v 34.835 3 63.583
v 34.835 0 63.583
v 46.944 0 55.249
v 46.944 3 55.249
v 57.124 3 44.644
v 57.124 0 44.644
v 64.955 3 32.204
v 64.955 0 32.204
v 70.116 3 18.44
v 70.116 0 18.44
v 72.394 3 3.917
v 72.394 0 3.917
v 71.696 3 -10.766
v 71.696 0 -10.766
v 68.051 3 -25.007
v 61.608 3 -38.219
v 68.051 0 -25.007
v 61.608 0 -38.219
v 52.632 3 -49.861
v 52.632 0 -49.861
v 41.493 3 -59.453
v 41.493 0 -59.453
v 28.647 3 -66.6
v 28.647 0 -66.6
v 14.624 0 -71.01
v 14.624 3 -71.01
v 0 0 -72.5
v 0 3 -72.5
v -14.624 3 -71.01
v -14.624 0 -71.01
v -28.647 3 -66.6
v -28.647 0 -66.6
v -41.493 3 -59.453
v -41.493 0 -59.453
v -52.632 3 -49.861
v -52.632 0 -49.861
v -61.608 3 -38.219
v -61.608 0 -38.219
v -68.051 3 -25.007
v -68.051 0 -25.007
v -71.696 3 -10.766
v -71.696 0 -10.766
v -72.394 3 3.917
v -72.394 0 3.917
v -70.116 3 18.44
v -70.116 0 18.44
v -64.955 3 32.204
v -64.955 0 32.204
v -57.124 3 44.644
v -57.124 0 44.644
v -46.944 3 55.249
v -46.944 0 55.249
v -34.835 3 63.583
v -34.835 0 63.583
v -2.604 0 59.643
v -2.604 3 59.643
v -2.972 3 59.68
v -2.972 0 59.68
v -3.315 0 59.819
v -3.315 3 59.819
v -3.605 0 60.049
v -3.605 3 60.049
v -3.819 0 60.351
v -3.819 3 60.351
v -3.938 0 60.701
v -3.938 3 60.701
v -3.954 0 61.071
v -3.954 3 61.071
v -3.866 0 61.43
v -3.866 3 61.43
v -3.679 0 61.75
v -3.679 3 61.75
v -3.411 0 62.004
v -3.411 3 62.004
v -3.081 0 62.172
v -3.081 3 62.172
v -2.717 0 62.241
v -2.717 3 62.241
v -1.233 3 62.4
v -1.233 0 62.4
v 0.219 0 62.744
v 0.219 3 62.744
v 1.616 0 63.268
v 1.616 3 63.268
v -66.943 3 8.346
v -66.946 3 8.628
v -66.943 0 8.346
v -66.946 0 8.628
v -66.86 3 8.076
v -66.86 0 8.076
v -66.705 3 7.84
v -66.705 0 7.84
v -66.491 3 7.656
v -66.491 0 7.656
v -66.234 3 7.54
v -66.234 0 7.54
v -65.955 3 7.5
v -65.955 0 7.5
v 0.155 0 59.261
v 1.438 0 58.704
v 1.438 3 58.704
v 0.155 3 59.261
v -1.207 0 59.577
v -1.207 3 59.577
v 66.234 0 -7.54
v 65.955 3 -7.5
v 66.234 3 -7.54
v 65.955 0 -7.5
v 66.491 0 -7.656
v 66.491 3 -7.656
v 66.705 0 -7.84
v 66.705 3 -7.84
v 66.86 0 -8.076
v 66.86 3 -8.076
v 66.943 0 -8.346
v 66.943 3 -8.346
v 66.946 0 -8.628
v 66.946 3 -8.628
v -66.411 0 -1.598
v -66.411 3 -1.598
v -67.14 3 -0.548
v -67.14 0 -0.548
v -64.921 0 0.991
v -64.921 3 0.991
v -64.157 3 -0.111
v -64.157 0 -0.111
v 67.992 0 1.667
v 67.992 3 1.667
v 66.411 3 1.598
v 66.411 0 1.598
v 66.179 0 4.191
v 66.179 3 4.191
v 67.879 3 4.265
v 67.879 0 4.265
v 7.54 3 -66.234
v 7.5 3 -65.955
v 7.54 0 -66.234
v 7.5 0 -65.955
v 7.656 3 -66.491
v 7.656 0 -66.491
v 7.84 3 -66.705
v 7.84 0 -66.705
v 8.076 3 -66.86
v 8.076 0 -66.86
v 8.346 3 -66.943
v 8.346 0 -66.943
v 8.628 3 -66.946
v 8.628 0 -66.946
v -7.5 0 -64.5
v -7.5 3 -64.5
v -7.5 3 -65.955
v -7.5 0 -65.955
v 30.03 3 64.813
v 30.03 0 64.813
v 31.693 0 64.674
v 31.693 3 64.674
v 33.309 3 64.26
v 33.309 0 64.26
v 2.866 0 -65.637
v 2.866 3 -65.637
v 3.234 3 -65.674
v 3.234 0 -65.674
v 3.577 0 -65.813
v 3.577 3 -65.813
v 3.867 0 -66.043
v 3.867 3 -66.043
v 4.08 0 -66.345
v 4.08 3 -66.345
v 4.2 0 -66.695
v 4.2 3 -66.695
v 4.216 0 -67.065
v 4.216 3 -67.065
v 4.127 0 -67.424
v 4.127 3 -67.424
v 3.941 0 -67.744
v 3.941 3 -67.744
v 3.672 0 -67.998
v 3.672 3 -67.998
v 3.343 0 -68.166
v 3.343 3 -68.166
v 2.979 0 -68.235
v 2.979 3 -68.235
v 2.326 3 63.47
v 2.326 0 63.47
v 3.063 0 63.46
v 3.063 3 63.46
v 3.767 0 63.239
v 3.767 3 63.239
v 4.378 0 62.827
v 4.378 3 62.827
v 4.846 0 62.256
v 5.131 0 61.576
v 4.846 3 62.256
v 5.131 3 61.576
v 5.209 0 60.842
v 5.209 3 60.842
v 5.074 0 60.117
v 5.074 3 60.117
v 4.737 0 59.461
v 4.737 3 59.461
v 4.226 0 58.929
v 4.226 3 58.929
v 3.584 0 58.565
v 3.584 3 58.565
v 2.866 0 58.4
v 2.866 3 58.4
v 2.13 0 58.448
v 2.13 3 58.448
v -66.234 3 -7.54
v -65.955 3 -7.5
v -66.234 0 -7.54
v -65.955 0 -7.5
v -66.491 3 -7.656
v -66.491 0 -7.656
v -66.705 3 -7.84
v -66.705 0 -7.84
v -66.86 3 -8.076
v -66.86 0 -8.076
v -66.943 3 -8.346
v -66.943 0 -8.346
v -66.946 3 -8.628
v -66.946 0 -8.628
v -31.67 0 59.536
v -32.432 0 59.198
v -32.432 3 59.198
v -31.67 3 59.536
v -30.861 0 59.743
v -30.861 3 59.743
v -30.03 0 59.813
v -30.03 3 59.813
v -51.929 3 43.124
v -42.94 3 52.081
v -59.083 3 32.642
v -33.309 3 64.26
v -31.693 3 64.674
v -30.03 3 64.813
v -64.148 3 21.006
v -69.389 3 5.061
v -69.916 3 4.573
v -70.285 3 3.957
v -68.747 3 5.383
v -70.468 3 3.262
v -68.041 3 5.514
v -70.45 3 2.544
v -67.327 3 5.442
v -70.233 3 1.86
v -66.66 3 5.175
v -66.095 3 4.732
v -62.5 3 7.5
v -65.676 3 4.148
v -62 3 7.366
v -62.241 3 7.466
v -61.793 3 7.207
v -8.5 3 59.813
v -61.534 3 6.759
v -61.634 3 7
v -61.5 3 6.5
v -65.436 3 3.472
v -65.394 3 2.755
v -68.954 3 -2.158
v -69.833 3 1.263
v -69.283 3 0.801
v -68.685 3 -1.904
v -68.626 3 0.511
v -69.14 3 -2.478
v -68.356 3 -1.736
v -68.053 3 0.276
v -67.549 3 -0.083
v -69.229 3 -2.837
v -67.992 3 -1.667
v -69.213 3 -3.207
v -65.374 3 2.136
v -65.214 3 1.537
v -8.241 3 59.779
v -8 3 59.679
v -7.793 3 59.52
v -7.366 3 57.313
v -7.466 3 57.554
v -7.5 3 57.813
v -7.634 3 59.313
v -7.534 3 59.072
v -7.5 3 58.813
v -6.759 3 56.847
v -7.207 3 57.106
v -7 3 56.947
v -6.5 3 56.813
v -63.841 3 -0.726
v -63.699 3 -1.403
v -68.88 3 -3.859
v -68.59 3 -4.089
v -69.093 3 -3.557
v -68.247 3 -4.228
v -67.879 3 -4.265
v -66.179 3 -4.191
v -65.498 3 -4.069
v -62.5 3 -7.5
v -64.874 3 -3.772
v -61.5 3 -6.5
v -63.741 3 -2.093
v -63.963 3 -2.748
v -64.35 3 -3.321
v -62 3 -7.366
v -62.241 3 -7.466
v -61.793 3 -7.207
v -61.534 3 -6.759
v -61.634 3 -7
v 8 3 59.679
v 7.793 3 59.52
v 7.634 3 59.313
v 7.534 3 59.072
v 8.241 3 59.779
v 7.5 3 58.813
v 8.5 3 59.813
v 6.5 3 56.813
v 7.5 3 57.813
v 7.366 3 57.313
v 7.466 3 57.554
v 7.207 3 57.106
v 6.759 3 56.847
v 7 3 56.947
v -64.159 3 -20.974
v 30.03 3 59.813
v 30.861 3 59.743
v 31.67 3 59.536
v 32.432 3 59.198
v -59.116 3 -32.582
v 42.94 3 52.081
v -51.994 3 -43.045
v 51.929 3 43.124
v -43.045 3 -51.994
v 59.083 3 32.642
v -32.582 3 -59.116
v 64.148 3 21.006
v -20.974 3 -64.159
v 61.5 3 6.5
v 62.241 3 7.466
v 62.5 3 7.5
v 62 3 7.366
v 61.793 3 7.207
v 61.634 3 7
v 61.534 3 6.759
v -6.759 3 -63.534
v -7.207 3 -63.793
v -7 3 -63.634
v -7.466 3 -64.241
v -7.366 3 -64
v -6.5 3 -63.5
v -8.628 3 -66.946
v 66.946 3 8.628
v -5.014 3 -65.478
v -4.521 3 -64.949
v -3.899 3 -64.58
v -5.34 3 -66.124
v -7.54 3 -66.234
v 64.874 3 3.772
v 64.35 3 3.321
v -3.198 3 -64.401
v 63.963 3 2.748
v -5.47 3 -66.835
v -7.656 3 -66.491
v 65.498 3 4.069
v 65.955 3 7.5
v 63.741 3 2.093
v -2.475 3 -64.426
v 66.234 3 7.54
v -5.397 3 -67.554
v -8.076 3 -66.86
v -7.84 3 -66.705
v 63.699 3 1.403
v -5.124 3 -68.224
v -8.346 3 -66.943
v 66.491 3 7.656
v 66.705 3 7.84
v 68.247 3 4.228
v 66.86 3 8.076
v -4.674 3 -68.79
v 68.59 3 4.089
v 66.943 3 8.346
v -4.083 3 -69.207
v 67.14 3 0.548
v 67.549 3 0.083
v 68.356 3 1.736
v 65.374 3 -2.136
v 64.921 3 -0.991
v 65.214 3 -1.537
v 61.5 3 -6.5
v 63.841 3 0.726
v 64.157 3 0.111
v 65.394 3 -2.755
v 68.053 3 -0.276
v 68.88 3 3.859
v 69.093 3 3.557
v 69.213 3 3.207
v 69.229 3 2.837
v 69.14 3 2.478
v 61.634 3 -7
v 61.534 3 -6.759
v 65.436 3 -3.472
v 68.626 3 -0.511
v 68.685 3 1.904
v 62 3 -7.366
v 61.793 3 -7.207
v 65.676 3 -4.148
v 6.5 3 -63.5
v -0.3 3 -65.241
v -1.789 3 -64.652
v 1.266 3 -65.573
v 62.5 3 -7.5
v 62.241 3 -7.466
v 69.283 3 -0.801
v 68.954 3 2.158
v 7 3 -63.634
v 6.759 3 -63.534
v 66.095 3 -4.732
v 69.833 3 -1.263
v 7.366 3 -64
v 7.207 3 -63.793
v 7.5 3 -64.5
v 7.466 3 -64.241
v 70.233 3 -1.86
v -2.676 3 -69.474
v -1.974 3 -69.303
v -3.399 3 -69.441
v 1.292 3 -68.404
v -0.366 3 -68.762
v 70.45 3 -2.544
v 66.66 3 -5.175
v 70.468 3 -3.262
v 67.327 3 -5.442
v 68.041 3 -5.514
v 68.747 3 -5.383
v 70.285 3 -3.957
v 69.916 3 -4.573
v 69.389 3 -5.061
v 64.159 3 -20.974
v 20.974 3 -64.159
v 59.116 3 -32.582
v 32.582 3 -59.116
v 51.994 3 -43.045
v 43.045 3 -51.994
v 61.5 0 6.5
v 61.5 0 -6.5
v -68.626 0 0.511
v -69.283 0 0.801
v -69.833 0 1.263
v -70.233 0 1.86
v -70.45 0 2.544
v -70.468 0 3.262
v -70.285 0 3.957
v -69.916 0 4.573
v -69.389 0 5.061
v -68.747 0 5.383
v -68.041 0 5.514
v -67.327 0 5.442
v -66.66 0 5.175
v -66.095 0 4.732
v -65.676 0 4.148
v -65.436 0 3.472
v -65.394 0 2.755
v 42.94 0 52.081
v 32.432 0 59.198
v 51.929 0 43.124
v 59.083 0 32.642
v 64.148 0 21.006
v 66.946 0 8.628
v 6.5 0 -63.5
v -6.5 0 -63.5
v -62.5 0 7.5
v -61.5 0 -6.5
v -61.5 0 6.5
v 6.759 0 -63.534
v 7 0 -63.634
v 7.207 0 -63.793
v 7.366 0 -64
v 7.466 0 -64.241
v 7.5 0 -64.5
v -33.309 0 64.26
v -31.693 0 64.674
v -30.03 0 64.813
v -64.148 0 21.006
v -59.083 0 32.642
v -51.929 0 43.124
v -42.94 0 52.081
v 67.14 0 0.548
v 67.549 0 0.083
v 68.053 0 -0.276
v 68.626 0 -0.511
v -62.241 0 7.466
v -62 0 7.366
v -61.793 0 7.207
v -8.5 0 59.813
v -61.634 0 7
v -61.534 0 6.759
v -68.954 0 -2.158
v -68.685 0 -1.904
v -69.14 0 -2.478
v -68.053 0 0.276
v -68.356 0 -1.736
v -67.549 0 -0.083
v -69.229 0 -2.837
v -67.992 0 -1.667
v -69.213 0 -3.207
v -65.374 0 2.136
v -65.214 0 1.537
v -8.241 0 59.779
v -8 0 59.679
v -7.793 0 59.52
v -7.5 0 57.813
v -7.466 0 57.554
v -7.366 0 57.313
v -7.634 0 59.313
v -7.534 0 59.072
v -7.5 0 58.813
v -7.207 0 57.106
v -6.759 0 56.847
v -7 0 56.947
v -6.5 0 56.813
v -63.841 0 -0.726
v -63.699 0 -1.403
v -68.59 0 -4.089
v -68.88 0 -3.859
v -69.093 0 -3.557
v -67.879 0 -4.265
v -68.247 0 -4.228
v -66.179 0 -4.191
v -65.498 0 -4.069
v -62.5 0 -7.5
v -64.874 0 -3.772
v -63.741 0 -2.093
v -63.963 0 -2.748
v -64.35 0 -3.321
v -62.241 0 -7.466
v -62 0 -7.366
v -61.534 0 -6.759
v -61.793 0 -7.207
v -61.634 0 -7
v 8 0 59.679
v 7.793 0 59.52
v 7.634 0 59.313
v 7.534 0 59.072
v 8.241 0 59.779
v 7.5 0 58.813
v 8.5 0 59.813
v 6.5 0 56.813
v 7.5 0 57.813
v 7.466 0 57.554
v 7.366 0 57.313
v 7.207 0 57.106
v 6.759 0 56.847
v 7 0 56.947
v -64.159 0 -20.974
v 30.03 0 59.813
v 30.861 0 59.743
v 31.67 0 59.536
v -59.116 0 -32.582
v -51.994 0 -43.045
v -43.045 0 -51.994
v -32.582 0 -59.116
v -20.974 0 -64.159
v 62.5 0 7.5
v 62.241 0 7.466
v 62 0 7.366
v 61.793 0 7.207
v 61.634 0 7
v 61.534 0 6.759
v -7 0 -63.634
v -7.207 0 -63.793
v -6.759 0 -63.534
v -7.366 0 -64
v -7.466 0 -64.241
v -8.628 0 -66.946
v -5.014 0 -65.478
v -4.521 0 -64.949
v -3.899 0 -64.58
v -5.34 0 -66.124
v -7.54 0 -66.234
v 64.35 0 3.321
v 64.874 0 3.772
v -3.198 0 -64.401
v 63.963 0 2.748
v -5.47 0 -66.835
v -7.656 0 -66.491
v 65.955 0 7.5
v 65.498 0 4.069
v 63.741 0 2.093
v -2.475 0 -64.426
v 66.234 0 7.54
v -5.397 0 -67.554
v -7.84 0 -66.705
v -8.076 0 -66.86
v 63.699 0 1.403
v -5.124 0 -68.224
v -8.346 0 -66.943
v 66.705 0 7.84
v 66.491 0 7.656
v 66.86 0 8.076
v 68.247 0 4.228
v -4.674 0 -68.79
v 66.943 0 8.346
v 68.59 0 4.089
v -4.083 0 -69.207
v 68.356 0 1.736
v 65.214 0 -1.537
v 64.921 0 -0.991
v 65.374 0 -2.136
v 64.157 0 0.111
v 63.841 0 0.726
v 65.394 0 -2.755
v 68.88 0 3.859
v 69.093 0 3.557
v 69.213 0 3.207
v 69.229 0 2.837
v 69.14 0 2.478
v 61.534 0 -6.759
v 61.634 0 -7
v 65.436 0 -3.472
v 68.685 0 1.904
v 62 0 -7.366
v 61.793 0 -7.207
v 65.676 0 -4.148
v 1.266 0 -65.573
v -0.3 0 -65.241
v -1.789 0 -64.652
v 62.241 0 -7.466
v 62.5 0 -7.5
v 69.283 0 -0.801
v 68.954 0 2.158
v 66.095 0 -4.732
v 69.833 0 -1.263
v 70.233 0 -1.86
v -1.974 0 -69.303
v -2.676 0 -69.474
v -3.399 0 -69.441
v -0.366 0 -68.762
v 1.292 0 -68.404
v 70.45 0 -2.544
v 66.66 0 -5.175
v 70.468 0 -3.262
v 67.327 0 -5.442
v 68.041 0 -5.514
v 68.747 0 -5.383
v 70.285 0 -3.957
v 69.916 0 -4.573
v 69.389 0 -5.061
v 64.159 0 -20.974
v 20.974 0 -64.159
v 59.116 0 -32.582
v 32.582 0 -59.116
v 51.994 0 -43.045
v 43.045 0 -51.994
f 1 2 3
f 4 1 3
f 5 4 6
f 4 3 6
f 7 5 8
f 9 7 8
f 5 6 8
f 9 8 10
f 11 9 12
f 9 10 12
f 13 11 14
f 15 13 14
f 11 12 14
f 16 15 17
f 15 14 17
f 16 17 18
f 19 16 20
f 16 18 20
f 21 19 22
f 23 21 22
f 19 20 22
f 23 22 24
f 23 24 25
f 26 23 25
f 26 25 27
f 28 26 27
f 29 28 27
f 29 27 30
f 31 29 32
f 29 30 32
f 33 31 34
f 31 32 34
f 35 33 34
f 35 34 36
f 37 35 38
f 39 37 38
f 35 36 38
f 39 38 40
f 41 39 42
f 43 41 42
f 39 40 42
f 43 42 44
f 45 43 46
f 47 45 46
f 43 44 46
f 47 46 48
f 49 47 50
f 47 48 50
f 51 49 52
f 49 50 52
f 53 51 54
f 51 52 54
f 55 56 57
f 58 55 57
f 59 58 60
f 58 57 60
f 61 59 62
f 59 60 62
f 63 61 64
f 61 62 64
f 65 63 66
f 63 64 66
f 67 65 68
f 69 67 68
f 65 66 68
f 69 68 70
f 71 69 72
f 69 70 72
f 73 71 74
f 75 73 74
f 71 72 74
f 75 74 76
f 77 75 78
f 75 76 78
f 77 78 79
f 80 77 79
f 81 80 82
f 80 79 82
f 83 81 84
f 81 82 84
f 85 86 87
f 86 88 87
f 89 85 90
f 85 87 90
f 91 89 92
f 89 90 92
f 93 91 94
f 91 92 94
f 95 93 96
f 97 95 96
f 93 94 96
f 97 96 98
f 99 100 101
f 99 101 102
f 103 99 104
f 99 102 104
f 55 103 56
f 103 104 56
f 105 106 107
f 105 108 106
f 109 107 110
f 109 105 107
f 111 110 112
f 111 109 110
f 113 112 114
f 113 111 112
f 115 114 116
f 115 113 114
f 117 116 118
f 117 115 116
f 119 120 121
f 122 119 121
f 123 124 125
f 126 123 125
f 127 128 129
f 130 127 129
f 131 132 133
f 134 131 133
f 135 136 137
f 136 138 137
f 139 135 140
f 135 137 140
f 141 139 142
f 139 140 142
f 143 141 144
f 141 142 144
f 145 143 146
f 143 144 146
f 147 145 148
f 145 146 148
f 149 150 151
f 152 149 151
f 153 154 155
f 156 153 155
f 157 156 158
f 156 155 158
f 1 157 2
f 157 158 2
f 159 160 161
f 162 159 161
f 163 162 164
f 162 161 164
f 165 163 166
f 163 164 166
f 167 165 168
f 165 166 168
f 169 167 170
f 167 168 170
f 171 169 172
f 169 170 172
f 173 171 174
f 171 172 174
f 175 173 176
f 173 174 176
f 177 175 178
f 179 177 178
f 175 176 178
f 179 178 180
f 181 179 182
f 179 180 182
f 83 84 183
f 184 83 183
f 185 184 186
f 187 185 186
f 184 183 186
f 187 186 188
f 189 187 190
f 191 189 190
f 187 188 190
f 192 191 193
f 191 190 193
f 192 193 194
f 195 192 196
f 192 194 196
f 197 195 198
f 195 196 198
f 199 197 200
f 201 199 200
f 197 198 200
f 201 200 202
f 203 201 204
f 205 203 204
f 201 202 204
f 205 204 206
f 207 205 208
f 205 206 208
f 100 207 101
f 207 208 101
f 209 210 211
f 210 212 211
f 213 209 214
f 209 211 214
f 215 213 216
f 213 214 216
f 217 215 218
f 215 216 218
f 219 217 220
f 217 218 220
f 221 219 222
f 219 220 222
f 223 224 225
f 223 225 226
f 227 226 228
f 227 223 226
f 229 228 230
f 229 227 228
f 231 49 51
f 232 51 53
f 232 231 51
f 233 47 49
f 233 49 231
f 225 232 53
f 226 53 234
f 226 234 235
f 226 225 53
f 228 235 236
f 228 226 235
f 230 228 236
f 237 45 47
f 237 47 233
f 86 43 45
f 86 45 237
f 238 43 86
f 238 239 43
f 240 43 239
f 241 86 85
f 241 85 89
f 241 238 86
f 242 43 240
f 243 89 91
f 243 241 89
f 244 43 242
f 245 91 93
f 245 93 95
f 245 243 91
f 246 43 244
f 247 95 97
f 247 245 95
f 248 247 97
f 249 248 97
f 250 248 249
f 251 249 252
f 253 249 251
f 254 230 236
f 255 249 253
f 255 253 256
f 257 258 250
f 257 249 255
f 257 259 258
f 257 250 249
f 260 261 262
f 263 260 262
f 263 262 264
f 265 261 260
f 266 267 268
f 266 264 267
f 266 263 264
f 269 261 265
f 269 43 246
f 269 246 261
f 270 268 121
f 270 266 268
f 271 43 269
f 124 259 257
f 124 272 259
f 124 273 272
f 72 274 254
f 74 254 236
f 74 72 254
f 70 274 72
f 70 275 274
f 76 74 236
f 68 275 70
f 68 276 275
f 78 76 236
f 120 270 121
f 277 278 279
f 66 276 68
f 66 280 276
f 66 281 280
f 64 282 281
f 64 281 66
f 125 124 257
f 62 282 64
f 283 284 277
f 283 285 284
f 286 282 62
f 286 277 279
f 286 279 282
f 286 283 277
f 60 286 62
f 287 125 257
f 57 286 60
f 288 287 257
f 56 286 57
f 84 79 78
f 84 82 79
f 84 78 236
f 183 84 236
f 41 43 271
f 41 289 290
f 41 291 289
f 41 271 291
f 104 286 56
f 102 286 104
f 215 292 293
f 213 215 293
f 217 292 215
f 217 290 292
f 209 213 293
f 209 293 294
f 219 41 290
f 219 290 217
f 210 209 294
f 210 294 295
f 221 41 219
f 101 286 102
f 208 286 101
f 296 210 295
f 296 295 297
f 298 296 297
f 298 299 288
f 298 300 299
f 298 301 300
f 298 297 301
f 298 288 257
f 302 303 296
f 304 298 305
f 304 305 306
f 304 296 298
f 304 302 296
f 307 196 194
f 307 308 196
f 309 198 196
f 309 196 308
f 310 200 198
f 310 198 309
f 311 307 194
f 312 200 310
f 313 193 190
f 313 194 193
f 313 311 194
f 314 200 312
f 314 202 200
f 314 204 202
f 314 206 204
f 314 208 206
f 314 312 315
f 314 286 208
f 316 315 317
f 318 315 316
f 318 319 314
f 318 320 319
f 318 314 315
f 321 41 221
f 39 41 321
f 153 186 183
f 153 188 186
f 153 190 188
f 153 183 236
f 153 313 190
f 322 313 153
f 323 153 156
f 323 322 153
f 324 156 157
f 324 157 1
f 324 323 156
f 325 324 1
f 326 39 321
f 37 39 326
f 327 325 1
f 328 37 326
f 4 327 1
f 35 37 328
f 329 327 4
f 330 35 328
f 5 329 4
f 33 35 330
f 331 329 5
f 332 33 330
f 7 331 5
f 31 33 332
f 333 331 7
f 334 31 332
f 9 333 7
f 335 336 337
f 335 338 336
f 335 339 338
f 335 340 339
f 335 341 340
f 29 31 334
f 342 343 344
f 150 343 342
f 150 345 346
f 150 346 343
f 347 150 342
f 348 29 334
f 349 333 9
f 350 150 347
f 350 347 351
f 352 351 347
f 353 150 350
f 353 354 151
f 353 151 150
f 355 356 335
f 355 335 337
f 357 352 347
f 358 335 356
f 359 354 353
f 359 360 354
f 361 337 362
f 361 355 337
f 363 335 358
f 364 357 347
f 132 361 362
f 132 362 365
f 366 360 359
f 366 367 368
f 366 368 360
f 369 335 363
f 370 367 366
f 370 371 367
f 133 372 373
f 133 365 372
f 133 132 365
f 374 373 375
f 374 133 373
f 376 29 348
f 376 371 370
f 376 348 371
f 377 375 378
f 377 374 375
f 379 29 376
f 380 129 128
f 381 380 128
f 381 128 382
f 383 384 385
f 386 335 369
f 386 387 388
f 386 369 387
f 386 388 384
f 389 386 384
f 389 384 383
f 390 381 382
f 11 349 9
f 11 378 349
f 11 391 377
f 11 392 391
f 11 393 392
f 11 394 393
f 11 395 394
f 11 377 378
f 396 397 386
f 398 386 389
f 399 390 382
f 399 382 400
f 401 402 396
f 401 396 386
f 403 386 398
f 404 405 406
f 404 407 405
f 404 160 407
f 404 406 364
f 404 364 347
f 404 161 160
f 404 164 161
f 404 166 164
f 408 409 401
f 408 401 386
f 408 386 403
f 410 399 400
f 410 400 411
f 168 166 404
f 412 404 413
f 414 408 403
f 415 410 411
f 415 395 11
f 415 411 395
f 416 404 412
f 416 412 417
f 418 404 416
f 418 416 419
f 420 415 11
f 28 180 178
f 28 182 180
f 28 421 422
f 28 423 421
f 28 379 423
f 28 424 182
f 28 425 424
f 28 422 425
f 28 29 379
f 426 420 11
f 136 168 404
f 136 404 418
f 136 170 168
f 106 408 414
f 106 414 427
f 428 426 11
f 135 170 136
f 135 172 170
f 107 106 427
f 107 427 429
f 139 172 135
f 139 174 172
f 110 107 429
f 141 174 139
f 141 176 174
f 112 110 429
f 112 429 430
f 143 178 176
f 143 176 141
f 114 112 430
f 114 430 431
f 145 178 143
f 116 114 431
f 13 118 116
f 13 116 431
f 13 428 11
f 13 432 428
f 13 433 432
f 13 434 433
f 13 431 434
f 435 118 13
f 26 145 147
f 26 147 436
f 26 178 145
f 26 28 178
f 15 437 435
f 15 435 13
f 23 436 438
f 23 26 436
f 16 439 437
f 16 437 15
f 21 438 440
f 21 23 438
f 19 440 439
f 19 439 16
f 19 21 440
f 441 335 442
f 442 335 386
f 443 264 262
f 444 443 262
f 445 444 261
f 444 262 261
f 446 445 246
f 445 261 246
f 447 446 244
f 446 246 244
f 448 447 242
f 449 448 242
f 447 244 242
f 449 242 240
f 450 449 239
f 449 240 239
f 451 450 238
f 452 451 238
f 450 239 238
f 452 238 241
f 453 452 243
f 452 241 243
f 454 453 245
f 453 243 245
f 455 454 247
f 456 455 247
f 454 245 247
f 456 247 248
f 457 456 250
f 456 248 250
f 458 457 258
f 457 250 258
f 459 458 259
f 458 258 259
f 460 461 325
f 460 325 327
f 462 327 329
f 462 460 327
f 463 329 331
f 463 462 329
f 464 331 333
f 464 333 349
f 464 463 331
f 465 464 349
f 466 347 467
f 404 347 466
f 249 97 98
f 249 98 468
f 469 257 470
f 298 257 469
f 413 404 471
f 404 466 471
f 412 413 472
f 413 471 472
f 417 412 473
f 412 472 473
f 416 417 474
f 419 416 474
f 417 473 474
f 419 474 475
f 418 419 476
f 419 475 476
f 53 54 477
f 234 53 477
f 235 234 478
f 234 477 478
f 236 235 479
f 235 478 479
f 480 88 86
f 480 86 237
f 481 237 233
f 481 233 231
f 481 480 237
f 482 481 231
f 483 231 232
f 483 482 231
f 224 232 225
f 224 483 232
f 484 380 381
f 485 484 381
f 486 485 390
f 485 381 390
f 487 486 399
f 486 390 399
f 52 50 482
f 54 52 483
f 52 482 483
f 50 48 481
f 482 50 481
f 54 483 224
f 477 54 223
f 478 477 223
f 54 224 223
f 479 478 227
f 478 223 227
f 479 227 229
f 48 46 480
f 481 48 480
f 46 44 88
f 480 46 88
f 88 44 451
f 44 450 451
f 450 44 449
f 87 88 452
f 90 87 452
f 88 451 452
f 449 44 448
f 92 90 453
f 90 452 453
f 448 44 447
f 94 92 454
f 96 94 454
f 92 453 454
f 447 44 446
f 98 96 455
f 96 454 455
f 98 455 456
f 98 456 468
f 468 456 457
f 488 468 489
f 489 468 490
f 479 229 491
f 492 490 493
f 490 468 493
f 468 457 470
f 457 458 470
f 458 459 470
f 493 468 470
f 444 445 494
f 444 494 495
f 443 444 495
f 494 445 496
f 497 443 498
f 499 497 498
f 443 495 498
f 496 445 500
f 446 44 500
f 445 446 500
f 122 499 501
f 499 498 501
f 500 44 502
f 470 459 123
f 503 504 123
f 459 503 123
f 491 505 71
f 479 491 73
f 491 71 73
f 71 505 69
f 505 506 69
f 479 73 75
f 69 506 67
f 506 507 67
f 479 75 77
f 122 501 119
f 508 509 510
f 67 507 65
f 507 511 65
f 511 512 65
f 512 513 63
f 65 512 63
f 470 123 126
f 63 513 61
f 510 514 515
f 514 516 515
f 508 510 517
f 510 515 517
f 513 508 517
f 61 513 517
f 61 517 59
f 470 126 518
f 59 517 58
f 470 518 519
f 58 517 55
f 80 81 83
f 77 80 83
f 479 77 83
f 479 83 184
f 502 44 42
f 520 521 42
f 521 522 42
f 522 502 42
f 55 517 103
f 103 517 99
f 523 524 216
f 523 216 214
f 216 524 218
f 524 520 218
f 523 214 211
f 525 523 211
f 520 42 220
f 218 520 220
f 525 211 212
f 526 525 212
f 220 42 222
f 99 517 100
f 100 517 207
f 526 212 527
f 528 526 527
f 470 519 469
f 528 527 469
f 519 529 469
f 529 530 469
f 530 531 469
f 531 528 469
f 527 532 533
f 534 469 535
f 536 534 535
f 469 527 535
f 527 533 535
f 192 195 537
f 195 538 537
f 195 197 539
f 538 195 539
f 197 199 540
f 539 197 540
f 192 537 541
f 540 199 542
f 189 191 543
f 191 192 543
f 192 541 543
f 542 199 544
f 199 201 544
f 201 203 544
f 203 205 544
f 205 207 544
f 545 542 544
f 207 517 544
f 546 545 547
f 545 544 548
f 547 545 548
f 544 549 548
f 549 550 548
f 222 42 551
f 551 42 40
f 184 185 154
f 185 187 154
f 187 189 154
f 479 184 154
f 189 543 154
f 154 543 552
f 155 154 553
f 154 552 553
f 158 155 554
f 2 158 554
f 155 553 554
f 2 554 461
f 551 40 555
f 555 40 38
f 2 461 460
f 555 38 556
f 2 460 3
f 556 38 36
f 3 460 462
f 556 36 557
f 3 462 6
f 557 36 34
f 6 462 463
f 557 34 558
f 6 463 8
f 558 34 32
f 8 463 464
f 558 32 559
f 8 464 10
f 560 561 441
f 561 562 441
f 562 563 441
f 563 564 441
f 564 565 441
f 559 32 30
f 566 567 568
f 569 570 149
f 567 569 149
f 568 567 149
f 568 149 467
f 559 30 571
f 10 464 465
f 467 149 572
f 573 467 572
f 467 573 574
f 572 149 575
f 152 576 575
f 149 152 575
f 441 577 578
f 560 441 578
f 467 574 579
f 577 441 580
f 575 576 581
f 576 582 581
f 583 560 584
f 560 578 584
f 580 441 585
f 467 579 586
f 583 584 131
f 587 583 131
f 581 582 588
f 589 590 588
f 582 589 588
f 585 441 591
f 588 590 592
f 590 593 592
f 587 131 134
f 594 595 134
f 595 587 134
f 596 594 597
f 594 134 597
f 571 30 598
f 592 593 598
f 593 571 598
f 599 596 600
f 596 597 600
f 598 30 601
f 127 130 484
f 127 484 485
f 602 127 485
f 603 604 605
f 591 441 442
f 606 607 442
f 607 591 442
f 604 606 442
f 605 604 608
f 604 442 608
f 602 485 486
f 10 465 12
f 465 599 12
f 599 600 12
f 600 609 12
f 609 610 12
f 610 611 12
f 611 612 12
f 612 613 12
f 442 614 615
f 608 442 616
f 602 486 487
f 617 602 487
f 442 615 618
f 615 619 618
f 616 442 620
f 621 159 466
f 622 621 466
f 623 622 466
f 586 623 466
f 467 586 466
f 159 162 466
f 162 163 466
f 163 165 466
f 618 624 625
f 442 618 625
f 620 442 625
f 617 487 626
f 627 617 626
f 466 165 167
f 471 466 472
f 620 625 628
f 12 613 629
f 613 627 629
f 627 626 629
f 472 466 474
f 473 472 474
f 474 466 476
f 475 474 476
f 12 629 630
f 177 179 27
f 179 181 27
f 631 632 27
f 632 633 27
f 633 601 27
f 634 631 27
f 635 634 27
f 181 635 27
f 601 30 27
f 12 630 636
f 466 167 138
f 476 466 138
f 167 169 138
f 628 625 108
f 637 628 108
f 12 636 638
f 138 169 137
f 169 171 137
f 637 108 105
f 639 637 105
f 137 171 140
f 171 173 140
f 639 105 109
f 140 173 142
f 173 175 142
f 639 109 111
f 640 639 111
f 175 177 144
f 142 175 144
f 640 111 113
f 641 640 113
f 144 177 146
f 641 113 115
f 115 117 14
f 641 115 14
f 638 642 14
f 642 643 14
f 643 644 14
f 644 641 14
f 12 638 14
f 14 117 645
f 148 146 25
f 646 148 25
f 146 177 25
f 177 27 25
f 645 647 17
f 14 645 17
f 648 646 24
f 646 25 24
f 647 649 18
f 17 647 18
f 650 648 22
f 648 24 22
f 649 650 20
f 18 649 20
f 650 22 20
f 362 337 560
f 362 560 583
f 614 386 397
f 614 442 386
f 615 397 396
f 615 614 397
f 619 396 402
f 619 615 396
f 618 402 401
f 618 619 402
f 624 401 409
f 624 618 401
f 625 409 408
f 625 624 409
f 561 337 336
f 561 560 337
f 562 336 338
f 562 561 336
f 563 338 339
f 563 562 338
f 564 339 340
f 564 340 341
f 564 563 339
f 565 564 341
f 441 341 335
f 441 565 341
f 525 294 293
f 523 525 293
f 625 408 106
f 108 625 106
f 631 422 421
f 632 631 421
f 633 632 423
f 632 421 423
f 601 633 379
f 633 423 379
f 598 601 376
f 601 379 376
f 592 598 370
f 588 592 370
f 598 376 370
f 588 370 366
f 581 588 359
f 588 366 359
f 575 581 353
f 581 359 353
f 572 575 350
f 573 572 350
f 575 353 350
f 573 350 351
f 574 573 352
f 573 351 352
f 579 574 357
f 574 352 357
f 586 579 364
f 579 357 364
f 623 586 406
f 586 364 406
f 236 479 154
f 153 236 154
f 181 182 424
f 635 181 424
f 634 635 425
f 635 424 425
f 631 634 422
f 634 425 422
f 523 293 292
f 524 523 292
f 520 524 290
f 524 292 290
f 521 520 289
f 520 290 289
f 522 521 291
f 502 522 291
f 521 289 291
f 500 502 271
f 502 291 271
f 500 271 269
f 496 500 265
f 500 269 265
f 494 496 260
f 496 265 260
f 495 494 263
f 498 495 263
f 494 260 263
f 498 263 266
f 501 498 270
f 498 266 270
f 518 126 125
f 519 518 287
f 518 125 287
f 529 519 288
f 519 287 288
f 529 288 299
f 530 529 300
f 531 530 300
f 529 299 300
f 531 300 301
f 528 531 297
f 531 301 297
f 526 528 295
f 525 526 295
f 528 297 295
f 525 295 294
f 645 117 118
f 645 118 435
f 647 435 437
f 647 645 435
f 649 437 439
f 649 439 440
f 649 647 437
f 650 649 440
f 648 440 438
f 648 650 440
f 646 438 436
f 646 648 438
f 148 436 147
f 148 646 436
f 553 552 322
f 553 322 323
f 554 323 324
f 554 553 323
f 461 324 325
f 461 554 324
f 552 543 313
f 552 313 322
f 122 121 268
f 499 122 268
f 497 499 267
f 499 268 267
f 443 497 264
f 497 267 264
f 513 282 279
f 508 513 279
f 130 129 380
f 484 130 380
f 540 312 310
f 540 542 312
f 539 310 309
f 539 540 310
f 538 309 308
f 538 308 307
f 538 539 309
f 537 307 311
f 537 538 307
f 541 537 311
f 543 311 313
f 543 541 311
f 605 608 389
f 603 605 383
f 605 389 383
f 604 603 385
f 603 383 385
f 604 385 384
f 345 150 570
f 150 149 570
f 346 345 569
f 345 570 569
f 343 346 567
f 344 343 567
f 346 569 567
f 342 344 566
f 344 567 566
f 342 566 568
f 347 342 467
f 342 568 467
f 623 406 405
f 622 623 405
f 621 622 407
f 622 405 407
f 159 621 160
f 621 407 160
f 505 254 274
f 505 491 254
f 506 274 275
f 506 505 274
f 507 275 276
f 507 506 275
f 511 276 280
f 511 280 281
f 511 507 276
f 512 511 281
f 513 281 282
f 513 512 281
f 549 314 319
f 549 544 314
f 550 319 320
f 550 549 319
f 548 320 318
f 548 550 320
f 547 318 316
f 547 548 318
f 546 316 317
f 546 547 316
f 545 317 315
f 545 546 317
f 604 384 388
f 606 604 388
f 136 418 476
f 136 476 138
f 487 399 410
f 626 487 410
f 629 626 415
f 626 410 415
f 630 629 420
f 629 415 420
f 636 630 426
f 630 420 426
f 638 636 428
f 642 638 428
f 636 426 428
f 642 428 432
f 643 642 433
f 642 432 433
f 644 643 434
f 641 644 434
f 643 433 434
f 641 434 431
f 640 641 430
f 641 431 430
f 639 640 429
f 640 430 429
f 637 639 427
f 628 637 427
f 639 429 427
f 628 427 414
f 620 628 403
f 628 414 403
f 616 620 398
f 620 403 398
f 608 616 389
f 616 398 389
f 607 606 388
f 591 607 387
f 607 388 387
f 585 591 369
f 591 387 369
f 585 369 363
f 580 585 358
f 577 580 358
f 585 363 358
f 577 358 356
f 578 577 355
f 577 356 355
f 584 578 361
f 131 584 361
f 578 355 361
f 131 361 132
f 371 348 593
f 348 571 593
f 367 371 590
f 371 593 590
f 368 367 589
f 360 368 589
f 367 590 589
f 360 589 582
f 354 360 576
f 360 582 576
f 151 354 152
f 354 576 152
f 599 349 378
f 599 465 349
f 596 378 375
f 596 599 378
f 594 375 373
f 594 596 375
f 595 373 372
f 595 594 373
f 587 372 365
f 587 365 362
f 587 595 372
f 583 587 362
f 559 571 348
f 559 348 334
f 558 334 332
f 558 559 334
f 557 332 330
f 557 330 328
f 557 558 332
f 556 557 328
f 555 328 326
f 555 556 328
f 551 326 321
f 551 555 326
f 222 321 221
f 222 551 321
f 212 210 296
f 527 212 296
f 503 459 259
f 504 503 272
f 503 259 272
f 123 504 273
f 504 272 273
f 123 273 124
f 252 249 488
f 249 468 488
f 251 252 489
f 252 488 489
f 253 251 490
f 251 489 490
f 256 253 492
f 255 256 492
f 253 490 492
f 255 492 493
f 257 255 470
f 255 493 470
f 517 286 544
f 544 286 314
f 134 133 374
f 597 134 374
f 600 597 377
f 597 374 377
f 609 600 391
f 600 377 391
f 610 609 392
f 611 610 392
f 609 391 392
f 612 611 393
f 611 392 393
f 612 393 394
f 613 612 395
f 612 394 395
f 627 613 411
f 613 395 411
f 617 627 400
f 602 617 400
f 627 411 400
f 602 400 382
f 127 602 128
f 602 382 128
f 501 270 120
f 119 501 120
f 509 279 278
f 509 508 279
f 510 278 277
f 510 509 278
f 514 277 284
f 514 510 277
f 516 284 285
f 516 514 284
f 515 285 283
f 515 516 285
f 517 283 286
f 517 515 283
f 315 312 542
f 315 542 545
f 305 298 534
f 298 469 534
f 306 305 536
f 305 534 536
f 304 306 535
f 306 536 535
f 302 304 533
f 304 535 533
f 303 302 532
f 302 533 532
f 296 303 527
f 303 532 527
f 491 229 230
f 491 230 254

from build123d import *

# Parameters (mm, degrees)
BOSS_EXTRUDE1_DEPTH = 3
SKETCH2_W           = 15
SKETCH2_H           = 3
SKETCH2_W_2         = 6
SKETCH2_H_2         = 15
SKETCH2_H_3         = 4
BOSS_EXTRUDE2_DEPTH = 3
CUT_EXTRUDE1_DEPTH  = 103.574363269
CUT_EXTRUDE2_DEPTH  = 103.574363269
FILLET1_R           = 1


with BuildPart() as part:
    # Sketch1 → Boss-Extrude1 (new body)
    with BuildSketch(Plane(origin=(0, 0, 0), x_dir=(1, 0, 0), z_dir=(0, 1, 0))):
        with BuildLine():
            Line((-30.029977361, -64.812867647), (30.029977361, -64.812867647))
            ThreePointArc((30.029977361, -64.812867647), (32.509837414, -64.500503794), (34.834773739, -63.582926471))
            ThreePointArc((34.834773739, -63.582926471), (0, 72.5), (-34.834773739, -63.582926471))
            ThreePointArc((-34.834773739, -63.582926471), (-32.509837414, -64.500503794), (-30.029977361, -64.812867647))
        make_face()
        with BuildLine():
            Line((-30.029977361, -59.812867647), (30.029977361, -59.812867647))
            ThreePointArc((30.029977361, -59.812867647), (31.269907388, -59.656685721), (32.43237555, -59.197897059))
            ThreePointArc((32.43237555, -59.197897059), (0, 67.5), (-32.43237555, -59.197897059))
            ThreePointArc((-32.43237555, -59.197897059), (-31.269907388, -59.656685721), (-30.029977361, -59.812867647))
        make_face(mode=Mode.SUBTRACT)
    extrude(amount=BOSS_EXTRUDE1_DEPTH)

    # Sketch2 → Boss-Extrude2 (add)
    with BuildSketch(Plane(origin=(0, 3, 0), x_dir=(1, 0, 0), z_dir=(0, 1, 0))):
        with Locations((0, -58.312867647)):
            Rectangle(SKETCH2_W, SKETCH2_H)
        with Locations((-64.5, 0)):
            Rectangle(SKETCH2_W_2, SKETCH2_H_2)
        with Locations((64.5, 0)):
            Rectangle(SKETCH2_W_2, SKETCH2_H_2)
        with Locations((0, 65.5)):
            Rectangle(SKETCH2_W, SKETCH2_H_3)
    extrude(amount=-BOSS_EXTRUDE2_DEPTH)

    # Sketch3 → Cut-Extrude1 (cut, through all)
    with BuildSketch(Plane(origin=(0, 3, 0), x_dir=(1, 0, 0), z_dir=(0, 1, 0))):
        with BuildLine():
            ThreePointArc((1.616415185, -63.268268373), (5.208836136, -60.842325617), (1.43798531, -58.704249242))
            ThreePointArc((1.43798531, -58.704249242), (-0.518832115, -59.450153065), (-2.604077426, -59.643178828))
            ThreePointArc((-2.604077426, -59.643178828), (-3.959545317, -60.885236313), (-2.717487833, -62.240704205))
            ThreePointArc((-2.717487833, -62.240704205), (-0.501795592, -62.548915084), (1.616415185, -63.268268373))
        make_face()
        with BuildLine():
            ThreePointArc((2.86579375, 65.637468158), (4.221261642, 66.879525642), (2.979204157, 68.234993534))
            ThreePointArc((2.979204157, 68.234993534), (0.457508066, 68.55960428), (-1.973827963, 69.303195854))
            ThreePointArc((-1.973827963, 69.303195854), (-5.470477452, 66.834714499), (-1.788525063, 64.652242401))
            ThreePointArc((-1.788525063, 64.652242401), (0.476176032, 65.439915463), (2.86579375, 65.637468158))
        make_face()
    extrude(amount=-CUT_EXTRUDE1_DEPTH, mode=Mode.SUBTRACT)

    # Sketch4 → Cut-Extrude2 (cut, through all)
    with BuildSketch(Plane(origin=(0, 3, 0), x_dir=(1, 0, 0), z_dir=(0, 1, 0))):
        with BuildLine():
            Line((-67.991984271, 1.667355653), (-66.410615041, 1.598311581))
            Line((-66.410615041, 1.598311581), (-67.139557844, 0.548042688))
            ThreePointArc((-67.139557844, 0.548042688), (-67.790591563, -0.111174979), (-68.626151234, -0.511490946))
            ThreePointArc((-68.626151234, -0.511490946), (-69.389235809, -5.060995376), (-65.394055237, -2.75473849))
            ThreePointArc((-65.394055237, -2.75473849), (-65.311299925, -1.831936022), (-64.921452747, -0.991440921))
            Line((-64.921452747, -0.991440921), (-64.156516626, 0.110687546))
            ThreePointArc((-64.156516626, 0.110687546), (-63.962986737, 2.747929937), (-66.179059274, 4.190678619))
            Line((-66.179059274, 4.190678619), (-67.878573864, 4.264881029))
            ThreePointArc((-67.878573864, 4.264881029), (-69.234041756, 3.022823544), (-67.991984271, 1.667355653))
        make_face()
        with BuildLine():
            Line((67.991984271, -1.667355653), (66.410615041, -1.598311581))
            Line((66.410615041, -1.598311581), (67.139557844, -0.548042688))
            ThreePointArc((67.139557844, -0.548042688), (67.790591563, 0.111174979), (68.626151234, 0.511490946))
            ThreePointArc((68.626151234, 0.511490946), (69.389235809, 5.060995376), (65.394055237, 2.75473849))
            ThreePointArc((65.394055237, 2.75473849), (65.311299925, 1.831936022), (64.921452747, 0.991440921))
            Line((64.921452747, 0.991440921), (64.156516626, -0.110687546))
            ThreePointArc((64.156516626, -0.110687546), (63.962986737, -2.747929937), (66.179059274, -4.190678619))
            Line((66.179059274, -4.190678619), (67.878573864, -4.264881029))
            ThreePointArc((67.878573864, -4.264881029), (69.234041756, -3.022823544), (67.991984271, -1.667355653))
        make_face()
    extrude(amount=-CUT_EXTRUDE2_DEPTH, mode=Mode.SUBTRACT)

    # Fillet1
    fillet1_edges = [part.edges().sort_by_distance(p)[0] for p in [
        (7.5, 1.5, 56.812867647),
        (7.5, 1.5, 59.812867647),
        (-7.5, 1.5, 59.812867647),
        (-7.5, 1.5, 56.812867647),
        (-67.082039325, 1.5, -7.5),
        (-67.082039325, 1.5, 7.5),
        (-61.5, 1.5, -7.5),
        (-61.5, 1.5, 7.5),
        (67.082039325, 1.5, 7.5),
        (67.082039325, 1.5, -7.5),
        (61.5, 1.5, 7.5),
        (61.5, 1.5, -7.5),
        (7.5, 1.5, -67.082039325),
        (7.5, 1.5, -63.5),
        (-7.5, 1.5, -67.082039325),
        (-7.5, 1.5, -63.5),
    ]]
    fillet(fillet1_edges, radius=FILLET1_R)


solid = part.part
